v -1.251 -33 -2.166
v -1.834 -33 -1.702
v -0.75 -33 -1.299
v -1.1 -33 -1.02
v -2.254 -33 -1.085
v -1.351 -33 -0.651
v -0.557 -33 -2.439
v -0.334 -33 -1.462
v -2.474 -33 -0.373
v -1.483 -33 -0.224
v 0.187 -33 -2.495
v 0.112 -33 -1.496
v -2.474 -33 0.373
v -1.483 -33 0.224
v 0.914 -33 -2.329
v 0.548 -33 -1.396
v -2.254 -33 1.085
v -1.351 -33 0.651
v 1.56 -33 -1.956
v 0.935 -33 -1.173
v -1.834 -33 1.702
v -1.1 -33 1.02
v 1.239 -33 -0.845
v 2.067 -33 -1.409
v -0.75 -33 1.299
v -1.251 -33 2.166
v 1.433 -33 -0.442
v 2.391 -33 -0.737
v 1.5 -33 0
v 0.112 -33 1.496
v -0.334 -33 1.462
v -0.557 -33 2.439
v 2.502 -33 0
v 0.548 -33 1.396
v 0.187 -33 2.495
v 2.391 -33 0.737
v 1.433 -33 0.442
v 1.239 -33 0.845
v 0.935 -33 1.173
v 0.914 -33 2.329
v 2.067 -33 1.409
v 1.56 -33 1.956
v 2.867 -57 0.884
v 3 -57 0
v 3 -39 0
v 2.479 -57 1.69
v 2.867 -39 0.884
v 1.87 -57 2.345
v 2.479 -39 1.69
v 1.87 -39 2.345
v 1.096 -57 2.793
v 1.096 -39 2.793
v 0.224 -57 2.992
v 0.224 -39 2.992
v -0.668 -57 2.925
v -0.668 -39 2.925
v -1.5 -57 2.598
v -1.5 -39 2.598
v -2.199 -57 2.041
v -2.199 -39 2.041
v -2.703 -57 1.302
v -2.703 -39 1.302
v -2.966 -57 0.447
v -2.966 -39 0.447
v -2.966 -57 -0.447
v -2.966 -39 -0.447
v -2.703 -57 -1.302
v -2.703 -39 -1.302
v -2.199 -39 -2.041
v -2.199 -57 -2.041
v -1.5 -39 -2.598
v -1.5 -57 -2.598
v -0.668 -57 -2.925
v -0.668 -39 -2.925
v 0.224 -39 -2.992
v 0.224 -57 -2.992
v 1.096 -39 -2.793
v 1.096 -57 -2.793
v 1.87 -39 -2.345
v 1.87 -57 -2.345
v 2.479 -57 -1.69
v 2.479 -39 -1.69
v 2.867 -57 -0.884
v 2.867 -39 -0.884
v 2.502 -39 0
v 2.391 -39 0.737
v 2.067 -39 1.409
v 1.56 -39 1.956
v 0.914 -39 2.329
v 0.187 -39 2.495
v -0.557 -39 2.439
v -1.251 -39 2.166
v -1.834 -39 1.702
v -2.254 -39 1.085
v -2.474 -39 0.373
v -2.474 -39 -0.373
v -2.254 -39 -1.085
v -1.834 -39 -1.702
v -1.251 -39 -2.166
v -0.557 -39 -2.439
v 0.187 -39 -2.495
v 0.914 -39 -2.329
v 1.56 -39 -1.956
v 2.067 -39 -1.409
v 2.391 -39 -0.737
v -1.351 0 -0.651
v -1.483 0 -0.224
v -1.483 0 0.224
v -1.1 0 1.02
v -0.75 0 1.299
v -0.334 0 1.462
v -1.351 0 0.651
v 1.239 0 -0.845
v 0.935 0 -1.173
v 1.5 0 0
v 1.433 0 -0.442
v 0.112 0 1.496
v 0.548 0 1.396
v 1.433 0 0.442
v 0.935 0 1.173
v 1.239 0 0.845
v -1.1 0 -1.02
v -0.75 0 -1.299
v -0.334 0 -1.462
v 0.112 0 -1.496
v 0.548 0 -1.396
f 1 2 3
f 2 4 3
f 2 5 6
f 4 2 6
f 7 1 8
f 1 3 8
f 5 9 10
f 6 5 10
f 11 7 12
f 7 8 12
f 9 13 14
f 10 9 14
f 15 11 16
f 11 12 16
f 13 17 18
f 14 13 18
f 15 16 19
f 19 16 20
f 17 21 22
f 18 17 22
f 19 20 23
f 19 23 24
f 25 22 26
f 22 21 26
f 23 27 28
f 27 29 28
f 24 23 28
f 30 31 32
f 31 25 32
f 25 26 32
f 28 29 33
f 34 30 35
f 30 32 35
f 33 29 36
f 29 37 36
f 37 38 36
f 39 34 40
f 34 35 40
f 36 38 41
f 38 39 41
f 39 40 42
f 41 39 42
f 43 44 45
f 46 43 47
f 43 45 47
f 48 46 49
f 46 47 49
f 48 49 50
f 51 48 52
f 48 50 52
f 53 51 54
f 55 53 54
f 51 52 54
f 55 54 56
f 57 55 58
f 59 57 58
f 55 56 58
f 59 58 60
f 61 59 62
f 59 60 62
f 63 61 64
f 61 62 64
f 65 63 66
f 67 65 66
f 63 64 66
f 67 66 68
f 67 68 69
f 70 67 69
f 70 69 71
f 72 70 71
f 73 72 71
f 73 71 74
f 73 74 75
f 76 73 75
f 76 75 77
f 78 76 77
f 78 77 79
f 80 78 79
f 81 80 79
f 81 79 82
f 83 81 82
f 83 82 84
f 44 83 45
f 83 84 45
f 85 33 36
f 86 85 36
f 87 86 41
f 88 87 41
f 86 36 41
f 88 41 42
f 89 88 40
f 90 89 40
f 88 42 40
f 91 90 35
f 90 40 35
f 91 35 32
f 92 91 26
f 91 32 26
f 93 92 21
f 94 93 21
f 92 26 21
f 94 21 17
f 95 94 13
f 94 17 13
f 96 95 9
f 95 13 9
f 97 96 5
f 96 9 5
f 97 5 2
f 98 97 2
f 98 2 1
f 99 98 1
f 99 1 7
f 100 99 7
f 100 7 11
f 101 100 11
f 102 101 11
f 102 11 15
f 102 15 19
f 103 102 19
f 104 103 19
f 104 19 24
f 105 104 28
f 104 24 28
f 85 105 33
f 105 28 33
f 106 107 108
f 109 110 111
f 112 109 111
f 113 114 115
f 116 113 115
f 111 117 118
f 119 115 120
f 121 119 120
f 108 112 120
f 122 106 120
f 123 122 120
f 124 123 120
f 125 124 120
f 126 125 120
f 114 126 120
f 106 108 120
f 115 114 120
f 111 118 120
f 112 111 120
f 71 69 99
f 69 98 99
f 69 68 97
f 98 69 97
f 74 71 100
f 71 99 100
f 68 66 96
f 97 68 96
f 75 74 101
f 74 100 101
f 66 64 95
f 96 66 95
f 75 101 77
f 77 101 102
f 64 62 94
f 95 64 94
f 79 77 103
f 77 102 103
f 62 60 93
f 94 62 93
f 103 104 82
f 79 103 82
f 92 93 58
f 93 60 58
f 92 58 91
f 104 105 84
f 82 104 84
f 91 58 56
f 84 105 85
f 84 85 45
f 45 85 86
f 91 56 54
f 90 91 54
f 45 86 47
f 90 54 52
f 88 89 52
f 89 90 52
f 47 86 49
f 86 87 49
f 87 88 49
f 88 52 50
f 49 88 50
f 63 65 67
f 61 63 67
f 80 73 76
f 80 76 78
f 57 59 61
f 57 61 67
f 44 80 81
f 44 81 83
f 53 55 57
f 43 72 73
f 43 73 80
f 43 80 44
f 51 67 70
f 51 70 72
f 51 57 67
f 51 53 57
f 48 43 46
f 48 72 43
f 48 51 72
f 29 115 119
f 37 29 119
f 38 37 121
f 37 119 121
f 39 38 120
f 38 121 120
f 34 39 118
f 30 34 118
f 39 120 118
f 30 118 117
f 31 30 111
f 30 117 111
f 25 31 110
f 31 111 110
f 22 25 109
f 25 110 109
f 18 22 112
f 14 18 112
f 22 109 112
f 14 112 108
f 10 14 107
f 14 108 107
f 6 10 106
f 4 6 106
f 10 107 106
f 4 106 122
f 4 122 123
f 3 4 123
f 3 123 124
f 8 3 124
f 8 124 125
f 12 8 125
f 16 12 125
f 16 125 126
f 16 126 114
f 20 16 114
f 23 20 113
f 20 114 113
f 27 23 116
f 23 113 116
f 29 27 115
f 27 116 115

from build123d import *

# Parameters (mm, degrees)
F0_R     = 1.5
F1_DEPTH = 33
F2_R     = 2.5016426342
F2_R_2   = 1.5
F3_DEPTH = 6
F4_R     = 3
F4_R_2   = 2.5016426342
F5_DEPTH = 18


with BuildPart() as f1:
    # F0 (on Front) → F1 (new body)
    with BuildSketch(Plane.XZ):
        Circle(F0_R)
    extrude(amount=F1_DEPTH)

    # F2 (on face) → F3 (join)
    with BuildSketch(Plane.XZ.offset(33)):
        Circle(F2_R)
        Circle(F2_R_2, mode=Mode.SUBTRACT)
        Circle(F2_R_2)
    extrude(amount=F3_DEPTH)

    # F4 (on face) → F5 (join)
    with BuildSketch(Plane.XZ.offset(39)):
        Circle(F4_R)
        Circle(F4_R_2, mode=Mode.SUBTRACT)
        Circle(F4_R_2)
    extrude(amount=F5_DEPTH)


solid = f1.part
